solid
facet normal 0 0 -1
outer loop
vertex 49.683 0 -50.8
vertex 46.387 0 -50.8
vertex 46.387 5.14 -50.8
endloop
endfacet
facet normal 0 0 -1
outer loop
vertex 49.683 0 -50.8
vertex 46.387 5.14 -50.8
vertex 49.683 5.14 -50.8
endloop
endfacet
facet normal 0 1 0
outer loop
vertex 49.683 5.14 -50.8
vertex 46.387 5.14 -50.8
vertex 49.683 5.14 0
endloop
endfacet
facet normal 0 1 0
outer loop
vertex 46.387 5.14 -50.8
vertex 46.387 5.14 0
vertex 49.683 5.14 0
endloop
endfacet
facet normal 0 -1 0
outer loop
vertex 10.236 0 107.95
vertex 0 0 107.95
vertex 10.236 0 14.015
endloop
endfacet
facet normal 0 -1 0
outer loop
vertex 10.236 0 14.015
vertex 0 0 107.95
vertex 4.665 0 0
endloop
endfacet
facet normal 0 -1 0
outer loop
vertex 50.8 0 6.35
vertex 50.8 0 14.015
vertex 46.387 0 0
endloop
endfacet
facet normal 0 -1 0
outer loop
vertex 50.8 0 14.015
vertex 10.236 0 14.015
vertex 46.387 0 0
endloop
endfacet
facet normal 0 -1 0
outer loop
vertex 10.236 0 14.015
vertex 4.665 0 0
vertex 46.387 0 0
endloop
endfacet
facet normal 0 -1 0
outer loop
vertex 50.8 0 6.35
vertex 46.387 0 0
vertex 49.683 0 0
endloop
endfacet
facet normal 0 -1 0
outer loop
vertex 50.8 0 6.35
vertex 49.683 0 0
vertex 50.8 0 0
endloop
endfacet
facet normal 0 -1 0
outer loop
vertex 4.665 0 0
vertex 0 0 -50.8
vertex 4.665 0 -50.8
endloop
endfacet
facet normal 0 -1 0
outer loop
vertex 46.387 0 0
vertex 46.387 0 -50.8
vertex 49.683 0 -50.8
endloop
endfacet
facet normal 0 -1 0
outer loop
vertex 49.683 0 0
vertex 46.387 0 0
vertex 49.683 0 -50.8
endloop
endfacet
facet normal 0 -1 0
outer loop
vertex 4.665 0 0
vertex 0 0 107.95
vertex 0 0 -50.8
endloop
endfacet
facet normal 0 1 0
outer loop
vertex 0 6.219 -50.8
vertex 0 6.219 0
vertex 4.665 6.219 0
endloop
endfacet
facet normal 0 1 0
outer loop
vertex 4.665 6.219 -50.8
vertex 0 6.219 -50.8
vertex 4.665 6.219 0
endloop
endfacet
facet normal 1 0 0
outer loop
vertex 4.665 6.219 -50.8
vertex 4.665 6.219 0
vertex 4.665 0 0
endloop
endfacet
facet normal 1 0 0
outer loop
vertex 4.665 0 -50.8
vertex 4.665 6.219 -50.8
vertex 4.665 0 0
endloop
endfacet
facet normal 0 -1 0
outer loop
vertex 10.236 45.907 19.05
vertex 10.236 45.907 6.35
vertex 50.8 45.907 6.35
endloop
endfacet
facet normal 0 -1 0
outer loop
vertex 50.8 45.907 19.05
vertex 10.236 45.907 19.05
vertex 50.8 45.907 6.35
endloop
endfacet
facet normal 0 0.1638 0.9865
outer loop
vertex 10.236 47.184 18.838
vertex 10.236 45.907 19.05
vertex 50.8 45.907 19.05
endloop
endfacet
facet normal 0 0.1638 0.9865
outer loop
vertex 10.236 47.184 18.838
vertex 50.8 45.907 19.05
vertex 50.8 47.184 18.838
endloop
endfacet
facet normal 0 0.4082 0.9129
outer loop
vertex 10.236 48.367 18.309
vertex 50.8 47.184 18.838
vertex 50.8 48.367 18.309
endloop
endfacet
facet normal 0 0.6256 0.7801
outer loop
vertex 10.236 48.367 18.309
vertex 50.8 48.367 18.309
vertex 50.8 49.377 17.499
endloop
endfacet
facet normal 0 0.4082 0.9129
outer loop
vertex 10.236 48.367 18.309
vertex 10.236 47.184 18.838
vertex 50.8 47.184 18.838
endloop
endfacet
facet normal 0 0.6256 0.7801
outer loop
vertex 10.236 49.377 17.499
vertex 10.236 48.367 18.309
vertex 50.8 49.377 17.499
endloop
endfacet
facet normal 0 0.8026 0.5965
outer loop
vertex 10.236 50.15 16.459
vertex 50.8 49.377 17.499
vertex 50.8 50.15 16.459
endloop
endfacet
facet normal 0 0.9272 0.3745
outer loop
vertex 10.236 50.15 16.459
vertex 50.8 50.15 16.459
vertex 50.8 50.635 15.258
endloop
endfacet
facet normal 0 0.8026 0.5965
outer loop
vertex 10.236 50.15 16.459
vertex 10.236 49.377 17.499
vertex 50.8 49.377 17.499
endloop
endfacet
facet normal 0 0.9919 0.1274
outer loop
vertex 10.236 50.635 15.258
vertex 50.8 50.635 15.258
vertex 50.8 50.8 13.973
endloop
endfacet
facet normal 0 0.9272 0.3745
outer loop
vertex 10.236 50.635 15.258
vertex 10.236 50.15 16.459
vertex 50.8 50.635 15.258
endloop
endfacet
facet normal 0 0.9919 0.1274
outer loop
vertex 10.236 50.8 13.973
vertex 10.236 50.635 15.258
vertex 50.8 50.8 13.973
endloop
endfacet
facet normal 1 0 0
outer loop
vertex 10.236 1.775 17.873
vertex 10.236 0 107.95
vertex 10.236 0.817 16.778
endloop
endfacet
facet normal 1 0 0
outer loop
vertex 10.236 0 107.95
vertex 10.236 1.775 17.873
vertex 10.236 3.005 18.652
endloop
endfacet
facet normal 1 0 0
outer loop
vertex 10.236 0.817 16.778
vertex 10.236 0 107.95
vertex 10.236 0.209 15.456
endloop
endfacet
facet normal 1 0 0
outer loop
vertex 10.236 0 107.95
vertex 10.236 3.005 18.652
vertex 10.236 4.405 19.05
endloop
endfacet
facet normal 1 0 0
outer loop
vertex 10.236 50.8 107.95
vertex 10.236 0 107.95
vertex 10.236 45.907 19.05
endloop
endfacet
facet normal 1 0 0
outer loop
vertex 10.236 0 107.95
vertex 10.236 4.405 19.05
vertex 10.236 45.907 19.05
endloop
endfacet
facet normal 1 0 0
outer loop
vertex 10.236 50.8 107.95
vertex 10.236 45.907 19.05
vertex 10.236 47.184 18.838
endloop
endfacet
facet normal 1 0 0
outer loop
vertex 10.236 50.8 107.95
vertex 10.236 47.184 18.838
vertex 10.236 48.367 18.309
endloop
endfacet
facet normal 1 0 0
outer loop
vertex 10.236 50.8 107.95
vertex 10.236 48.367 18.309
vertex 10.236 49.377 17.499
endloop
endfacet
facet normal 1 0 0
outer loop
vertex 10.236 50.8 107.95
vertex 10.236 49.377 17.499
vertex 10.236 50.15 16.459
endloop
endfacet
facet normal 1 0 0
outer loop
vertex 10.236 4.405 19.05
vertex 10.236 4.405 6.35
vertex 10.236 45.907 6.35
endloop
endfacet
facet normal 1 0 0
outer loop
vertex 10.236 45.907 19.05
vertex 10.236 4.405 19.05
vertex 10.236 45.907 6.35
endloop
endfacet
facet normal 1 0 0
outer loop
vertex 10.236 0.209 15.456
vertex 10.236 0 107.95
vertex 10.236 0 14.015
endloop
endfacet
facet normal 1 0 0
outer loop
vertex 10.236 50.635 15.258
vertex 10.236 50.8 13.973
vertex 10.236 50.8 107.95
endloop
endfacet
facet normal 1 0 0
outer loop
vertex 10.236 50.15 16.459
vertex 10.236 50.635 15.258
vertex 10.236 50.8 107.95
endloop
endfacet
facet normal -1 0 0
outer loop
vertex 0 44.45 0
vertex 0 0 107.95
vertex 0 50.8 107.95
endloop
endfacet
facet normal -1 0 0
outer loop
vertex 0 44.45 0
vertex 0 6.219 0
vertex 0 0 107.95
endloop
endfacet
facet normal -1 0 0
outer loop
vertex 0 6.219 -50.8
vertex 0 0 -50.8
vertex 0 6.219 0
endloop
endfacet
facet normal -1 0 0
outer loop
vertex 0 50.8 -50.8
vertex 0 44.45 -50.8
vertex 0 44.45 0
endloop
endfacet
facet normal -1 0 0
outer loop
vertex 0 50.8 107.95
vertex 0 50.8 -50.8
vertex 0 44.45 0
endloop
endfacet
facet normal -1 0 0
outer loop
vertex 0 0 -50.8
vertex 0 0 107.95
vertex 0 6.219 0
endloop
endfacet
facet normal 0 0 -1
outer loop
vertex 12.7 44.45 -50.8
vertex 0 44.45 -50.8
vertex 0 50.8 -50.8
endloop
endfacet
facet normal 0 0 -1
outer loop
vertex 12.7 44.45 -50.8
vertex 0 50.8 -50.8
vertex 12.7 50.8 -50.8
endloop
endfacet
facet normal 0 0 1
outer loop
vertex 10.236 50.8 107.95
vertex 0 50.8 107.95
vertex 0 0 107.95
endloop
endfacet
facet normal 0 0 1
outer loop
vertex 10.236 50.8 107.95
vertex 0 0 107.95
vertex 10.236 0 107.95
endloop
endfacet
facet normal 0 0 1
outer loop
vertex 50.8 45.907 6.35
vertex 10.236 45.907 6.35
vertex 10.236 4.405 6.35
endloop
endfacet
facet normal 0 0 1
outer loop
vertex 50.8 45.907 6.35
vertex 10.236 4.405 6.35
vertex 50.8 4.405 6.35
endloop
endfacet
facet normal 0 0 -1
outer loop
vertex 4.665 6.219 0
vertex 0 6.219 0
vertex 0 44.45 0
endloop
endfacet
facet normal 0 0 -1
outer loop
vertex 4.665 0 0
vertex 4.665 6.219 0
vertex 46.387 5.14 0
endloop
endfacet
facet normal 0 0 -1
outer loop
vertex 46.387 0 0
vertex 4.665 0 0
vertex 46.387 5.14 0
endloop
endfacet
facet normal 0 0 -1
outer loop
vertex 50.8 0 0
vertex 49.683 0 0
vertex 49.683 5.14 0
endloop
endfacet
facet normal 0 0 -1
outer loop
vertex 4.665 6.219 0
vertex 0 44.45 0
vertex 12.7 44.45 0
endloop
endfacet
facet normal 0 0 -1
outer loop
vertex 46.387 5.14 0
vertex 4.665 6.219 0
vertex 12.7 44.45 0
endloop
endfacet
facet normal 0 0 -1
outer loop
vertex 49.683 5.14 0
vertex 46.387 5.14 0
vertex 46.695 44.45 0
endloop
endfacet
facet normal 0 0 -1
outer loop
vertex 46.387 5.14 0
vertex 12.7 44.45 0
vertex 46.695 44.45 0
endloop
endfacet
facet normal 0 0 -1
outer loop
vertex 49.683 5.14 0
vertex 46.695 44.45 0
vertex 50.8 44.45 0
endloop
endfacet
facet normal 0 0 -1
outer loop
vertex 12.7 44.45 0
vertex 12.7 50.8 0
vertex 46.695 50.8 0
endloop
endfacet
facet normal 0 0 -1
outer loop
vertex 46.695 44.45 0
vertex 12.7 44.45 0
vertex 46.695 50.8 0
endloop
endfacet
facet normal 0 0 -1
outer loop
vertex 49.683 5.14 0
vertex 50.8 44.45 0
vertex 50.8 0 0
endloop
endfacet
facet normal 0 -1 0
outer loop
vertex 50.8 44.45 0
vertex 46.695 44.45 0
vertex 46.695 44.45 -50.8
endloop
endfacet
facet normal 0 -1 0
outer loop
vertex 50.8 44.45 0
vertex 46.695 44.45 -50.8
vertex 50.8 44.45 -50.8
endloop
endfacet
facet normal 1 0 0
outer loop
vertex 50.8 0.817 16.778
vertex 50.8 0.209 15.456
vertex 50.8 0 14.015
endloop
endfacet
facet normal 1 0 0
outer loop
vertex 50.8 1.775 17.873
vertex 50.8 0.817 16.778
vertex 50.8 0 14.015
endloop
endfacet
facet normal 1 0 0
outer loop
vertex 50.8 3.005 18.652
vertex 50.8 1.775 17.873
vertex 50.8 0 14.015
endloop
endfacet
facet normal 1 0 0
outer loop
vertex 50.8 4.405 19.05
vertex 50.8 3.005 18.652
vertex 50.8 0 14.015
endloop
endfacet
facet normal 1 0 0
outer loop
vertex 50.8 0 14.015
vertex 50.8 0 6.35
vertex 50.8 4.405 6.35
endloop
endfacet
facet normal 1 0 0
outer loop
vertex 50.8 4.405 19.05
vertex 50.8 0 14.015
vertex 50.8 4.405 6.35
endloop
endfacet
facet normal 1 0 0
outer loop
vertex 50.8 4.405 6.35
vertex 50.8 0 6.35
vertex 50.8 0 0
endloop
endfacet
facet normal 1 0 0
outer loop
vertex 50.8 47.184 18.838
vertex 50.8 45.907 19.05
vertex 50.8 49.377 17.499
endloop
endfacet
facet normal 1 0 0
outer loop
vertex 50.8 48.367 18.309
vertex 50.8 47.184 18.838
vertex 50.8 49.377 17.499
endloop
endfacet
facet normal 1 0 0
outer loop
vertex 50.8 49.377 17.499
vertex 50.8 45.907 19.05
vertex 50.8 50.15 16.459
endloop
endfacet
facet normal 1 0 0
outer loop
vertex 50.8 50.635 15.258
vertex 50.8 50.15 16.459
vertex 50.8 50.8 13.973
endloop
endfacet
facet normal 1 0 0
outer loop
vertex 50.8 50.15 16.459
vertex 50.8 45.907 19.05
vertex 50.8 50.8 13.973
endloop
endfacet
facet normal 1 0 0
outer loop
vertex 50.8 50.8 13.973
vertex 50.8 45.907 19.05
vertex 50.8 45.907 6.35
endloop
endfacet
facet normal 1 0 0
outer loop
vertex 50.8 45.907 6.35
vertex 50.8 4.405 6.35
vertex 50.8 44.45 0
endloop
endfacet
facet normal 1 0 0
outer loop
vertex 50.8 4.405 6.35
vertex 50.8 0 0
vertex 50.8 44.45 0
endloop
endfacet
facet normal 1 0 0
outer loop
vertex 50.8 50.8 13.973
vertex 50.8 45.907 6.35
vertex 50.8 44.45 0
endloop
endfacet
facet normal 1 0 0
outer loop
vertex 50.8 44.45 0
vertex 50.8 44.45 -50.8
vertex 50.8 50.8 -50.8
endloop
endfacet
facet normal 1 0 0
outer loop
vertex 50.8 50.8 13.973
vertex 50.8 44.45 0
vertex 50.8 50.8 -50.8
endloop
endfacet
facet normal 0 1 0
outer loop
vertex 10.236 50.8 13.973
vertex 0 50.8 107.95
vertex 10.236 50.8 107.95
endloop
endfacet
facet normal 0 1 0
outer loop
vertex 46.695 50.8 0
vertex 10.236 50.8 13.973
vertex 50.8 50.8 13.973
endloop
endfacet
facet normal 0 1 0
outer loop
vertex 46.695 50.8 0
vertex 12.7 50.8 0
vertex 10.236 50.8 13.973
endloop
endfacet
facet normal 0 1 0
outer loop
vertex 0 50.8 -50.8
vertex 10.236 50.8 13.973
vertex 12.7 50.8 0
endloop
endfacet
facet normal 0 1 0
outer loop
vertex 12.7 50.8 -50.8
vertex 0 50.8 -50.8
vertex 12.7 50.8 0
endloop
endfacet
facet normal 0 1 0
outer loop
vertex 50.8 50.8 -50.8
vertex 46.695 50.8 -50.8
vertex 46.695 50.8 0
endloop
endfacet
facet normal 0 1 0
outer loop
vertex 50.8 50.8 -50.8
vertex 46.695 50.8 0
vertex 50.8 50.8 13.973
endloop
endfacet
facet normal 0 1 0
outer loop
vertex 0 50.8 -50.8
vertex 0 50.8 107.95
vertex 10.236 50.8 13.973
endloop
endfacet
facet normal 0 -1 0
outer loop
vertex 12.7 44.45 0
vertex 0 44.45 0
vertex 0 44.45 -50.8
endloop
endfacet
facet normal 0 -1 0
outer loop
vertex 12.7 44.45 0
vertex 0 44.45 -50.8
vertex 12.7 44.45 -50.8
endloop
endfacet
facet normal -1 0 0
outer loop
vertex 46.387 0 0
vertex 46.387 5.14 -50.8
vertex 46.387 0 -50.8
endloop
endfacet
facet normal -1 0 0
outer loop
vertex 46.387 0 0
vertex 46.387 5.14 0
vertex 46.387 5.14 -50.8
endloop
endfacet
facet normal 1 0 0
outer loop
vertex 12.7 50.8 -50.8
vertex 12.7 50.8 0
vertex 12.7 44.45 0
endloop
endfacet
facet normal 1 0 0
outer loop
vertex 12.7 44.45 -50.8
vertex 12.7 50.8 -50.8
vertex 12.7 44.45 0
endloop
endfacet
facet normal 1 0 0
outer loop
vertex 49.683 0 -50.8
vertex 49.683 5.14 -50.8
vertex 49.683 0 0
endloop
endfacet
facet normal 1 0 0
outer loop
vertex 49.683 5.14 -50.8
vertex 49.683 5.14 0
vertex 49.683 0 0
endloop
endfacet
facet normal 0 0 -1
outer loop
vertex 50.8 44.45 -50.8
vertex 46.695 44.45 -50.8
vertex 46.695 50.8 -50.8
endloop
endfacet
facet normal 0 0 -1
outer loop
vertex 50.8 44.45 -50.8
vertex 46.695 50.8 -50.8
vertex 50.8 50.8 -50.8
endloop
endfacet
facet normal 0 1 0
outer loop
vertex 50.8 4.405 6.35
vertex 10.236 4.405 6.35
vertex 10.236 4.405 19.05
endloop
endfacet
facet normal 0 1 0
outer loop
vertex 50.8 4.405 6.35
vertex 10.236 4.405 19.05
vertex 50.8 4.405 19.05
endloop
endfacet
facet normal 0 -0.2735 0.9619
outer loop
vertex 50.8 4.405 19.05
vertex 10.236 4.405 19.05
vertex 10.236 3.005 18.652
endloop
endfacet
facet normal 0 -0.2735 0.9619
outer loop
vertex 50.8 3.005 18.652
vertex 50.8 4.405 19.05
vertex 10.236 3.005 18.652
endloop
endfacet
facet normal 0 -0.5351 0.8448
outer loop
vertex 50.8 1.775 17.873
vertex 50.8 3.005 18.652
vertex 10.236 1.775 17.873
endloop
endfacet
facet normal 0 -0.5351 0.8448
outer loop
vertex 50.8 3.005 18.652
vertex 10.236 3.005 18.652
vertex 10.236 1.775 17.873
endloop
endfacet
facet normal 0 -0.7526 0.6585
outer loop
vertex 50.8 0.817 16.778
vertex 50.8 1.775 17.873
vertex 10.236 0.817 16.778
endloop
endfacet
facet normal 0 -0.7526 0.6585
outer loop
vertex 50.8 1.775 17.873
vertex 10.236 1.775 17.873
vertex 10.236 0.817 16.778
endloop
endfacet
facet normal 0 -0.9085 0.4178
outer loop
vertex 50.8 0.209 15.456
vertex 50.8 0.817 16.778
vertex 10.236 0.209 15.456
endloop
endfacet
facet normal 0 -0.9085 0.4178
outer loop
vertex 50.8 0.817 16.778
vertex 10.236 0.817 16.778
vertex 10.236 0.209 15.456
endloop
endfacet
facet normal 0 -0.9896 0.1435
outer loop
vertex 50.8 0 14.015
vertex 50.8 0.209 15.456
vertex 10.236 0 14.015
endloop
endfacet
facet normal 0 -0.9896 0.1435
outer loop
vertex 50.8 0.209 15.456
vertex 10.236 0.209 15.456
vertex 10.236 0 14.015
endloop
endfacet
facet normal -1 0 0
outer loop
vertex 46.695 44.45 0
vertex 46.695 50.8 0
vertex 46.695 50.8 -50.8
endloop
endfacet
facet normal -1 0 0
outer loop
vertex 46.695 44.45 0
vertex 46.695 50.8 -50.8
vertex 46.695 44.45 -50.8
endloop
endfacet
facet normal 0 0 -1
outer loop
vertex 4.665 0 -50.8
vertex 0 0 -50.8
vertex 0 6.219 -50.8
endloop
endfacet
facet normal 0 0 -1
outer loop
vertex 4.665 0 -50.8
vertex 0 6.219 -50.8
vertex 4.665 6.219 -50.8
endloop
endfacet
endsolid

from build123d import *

# Parameters (mm, degrees)
F0_W         = 50.8
F0_H         = 50.8
F1_DEPTH     = 6.35
F2_W         = 3.2963603735
F2_H         = 5.1404060796
F2_W_2       = 4.6653077006
F2_H_2       = 6.2190000899
F2_W_3       = 4.104912895
F2_H_3       = 6.35
F2_W_4       = 12.7
F3_DEPTH     = 25.4
F4_DEPTH     = 25.4
F5_W         = 10.2360965684
F5_H         = 50.8
F6_DEPTH     = 101.6
F7_W         = 40.5639034316
F7_H         = 4.4053453021
F8_DEPTH     = 12.7
F9_W         = 40.5639034316
F9_H         = 4.8934674442
F10_DEPTH    = 12.7
F11_T1_DEPTH = 53.1514074134
F12_T1_DEPTH = 53.255338931


# Not quite as in the source:
# - a fillet or chamfer that OpenCascade refuses, or shapes differently, is made with other operations: its cross-section is extruded or revolved along the edge and cut away or added


with BuildPart() as f1:
    # F0 (on Top) → F1 (new body)
    with BuildSketch(Plane.XY):
        with Locations((25.4, 25.4)):
            Rectangle(F0_W, F0_H)
    extrude(amount=F1_DEPTH)

    # F2 (on face) → F3 (join)
    with BuildSketch(Plane(origin=(0, 0, 0), x_dir=(1, 0, 0), z_dir=(0, 0, -1))):
        with Locations((48.0348914862, -2.5702030398)):
            Rectangle(F2_W, F2_H)
        with Locations((2.3326538503, -3.109500045)):
            Rectangle(F2_W_2, F2_H_2)
        with Locations((48.7475435525, -47.625)):
            Rectangle(F2_W_3, F2_H_3)
        with Locations((6.35, -47.625)):
            Rectangle(F2_W_4, F2_H_3)
    extrude(amount=F3_DEPTH)

    # F4 (add): faces of the model
    f4_faces = [f1.faces().sort_by_distance(p)[0] for p in [
        (48.0348914862, 2.5702030398, -25.4),
        (2.3326538503, 3.109500045, -25.4),
        (6.35, 47.625, -25.4),
        (48.7475435525, 47.625, -25.4),
    ]]
    extrude(f4_faces, amount=F4_DEPTH)

    # F5 (on face) → F6 (join)
    with BuildSketch(Plane.XY.offset(6.35)):
        with Locations((5.1180482842, 25.4)):
            Rectangle(F5_W, F5_H)
    extrude(amount=F6_DEPTH)

    # F7 (on face) → F8 (join)
    with BuildSketch(Plane.XY.offset(6.35)):
        with Locations((30.5180482842, 2.202672651)):
            Rectangle(F7_W, F7_H)
    extrude(amount=F8_DEPTH)

    # F9 (on face) → F10 (join)
    with BuildSketch(Plane.XY.offset(6.35)):
        with Locations((30.5180482842, 48.3532662779)):
            Rectangle(F9_W, F9_H)
    extrude(amount=F10_DEPTH)

    # F11: fillet of radius 5.08 on 1 edges, made by hand

    # F11_s2 → F11_t1 (cut)
    with BuildSketch(Plane.YZ.offset(10.2360965684)):
        with BuildLine():
            ThreePointArc((4.4053453021, 19.05), (1.2568046175, 17.3600809275), (0, 14.0149984073))
            Line((0, 14.0149984073), (0, 19.05))
            Line((0, 19.05), (4.4053453021, 19.05))
        make_face()
    extrude(amount=F11_T1_DEPTH, mode=Mode.SUBTRACT)

    # F12: fillet of radius 5.08 on 1 edges, made by hand

    # F12_s2 → F12_t1 (cut)
    with BuildSketch(Plane.YZ.offset(10.2360965684)):
        with BuildLine():
            ThreePointArc((45.9065325558, 19.05), (49.3774571346, 17.498962257), (50.8, 13.9734258002))
            Line((50.8, 13.9734258002), (50.8, 19.05))
            Line((50.8, 19.05), (45.9065325558, 19.05))
        make_face()
    extrude(amount=F12_T1_DEPTH, mode=Mode.SUBTRACT)


solid = f1.part
